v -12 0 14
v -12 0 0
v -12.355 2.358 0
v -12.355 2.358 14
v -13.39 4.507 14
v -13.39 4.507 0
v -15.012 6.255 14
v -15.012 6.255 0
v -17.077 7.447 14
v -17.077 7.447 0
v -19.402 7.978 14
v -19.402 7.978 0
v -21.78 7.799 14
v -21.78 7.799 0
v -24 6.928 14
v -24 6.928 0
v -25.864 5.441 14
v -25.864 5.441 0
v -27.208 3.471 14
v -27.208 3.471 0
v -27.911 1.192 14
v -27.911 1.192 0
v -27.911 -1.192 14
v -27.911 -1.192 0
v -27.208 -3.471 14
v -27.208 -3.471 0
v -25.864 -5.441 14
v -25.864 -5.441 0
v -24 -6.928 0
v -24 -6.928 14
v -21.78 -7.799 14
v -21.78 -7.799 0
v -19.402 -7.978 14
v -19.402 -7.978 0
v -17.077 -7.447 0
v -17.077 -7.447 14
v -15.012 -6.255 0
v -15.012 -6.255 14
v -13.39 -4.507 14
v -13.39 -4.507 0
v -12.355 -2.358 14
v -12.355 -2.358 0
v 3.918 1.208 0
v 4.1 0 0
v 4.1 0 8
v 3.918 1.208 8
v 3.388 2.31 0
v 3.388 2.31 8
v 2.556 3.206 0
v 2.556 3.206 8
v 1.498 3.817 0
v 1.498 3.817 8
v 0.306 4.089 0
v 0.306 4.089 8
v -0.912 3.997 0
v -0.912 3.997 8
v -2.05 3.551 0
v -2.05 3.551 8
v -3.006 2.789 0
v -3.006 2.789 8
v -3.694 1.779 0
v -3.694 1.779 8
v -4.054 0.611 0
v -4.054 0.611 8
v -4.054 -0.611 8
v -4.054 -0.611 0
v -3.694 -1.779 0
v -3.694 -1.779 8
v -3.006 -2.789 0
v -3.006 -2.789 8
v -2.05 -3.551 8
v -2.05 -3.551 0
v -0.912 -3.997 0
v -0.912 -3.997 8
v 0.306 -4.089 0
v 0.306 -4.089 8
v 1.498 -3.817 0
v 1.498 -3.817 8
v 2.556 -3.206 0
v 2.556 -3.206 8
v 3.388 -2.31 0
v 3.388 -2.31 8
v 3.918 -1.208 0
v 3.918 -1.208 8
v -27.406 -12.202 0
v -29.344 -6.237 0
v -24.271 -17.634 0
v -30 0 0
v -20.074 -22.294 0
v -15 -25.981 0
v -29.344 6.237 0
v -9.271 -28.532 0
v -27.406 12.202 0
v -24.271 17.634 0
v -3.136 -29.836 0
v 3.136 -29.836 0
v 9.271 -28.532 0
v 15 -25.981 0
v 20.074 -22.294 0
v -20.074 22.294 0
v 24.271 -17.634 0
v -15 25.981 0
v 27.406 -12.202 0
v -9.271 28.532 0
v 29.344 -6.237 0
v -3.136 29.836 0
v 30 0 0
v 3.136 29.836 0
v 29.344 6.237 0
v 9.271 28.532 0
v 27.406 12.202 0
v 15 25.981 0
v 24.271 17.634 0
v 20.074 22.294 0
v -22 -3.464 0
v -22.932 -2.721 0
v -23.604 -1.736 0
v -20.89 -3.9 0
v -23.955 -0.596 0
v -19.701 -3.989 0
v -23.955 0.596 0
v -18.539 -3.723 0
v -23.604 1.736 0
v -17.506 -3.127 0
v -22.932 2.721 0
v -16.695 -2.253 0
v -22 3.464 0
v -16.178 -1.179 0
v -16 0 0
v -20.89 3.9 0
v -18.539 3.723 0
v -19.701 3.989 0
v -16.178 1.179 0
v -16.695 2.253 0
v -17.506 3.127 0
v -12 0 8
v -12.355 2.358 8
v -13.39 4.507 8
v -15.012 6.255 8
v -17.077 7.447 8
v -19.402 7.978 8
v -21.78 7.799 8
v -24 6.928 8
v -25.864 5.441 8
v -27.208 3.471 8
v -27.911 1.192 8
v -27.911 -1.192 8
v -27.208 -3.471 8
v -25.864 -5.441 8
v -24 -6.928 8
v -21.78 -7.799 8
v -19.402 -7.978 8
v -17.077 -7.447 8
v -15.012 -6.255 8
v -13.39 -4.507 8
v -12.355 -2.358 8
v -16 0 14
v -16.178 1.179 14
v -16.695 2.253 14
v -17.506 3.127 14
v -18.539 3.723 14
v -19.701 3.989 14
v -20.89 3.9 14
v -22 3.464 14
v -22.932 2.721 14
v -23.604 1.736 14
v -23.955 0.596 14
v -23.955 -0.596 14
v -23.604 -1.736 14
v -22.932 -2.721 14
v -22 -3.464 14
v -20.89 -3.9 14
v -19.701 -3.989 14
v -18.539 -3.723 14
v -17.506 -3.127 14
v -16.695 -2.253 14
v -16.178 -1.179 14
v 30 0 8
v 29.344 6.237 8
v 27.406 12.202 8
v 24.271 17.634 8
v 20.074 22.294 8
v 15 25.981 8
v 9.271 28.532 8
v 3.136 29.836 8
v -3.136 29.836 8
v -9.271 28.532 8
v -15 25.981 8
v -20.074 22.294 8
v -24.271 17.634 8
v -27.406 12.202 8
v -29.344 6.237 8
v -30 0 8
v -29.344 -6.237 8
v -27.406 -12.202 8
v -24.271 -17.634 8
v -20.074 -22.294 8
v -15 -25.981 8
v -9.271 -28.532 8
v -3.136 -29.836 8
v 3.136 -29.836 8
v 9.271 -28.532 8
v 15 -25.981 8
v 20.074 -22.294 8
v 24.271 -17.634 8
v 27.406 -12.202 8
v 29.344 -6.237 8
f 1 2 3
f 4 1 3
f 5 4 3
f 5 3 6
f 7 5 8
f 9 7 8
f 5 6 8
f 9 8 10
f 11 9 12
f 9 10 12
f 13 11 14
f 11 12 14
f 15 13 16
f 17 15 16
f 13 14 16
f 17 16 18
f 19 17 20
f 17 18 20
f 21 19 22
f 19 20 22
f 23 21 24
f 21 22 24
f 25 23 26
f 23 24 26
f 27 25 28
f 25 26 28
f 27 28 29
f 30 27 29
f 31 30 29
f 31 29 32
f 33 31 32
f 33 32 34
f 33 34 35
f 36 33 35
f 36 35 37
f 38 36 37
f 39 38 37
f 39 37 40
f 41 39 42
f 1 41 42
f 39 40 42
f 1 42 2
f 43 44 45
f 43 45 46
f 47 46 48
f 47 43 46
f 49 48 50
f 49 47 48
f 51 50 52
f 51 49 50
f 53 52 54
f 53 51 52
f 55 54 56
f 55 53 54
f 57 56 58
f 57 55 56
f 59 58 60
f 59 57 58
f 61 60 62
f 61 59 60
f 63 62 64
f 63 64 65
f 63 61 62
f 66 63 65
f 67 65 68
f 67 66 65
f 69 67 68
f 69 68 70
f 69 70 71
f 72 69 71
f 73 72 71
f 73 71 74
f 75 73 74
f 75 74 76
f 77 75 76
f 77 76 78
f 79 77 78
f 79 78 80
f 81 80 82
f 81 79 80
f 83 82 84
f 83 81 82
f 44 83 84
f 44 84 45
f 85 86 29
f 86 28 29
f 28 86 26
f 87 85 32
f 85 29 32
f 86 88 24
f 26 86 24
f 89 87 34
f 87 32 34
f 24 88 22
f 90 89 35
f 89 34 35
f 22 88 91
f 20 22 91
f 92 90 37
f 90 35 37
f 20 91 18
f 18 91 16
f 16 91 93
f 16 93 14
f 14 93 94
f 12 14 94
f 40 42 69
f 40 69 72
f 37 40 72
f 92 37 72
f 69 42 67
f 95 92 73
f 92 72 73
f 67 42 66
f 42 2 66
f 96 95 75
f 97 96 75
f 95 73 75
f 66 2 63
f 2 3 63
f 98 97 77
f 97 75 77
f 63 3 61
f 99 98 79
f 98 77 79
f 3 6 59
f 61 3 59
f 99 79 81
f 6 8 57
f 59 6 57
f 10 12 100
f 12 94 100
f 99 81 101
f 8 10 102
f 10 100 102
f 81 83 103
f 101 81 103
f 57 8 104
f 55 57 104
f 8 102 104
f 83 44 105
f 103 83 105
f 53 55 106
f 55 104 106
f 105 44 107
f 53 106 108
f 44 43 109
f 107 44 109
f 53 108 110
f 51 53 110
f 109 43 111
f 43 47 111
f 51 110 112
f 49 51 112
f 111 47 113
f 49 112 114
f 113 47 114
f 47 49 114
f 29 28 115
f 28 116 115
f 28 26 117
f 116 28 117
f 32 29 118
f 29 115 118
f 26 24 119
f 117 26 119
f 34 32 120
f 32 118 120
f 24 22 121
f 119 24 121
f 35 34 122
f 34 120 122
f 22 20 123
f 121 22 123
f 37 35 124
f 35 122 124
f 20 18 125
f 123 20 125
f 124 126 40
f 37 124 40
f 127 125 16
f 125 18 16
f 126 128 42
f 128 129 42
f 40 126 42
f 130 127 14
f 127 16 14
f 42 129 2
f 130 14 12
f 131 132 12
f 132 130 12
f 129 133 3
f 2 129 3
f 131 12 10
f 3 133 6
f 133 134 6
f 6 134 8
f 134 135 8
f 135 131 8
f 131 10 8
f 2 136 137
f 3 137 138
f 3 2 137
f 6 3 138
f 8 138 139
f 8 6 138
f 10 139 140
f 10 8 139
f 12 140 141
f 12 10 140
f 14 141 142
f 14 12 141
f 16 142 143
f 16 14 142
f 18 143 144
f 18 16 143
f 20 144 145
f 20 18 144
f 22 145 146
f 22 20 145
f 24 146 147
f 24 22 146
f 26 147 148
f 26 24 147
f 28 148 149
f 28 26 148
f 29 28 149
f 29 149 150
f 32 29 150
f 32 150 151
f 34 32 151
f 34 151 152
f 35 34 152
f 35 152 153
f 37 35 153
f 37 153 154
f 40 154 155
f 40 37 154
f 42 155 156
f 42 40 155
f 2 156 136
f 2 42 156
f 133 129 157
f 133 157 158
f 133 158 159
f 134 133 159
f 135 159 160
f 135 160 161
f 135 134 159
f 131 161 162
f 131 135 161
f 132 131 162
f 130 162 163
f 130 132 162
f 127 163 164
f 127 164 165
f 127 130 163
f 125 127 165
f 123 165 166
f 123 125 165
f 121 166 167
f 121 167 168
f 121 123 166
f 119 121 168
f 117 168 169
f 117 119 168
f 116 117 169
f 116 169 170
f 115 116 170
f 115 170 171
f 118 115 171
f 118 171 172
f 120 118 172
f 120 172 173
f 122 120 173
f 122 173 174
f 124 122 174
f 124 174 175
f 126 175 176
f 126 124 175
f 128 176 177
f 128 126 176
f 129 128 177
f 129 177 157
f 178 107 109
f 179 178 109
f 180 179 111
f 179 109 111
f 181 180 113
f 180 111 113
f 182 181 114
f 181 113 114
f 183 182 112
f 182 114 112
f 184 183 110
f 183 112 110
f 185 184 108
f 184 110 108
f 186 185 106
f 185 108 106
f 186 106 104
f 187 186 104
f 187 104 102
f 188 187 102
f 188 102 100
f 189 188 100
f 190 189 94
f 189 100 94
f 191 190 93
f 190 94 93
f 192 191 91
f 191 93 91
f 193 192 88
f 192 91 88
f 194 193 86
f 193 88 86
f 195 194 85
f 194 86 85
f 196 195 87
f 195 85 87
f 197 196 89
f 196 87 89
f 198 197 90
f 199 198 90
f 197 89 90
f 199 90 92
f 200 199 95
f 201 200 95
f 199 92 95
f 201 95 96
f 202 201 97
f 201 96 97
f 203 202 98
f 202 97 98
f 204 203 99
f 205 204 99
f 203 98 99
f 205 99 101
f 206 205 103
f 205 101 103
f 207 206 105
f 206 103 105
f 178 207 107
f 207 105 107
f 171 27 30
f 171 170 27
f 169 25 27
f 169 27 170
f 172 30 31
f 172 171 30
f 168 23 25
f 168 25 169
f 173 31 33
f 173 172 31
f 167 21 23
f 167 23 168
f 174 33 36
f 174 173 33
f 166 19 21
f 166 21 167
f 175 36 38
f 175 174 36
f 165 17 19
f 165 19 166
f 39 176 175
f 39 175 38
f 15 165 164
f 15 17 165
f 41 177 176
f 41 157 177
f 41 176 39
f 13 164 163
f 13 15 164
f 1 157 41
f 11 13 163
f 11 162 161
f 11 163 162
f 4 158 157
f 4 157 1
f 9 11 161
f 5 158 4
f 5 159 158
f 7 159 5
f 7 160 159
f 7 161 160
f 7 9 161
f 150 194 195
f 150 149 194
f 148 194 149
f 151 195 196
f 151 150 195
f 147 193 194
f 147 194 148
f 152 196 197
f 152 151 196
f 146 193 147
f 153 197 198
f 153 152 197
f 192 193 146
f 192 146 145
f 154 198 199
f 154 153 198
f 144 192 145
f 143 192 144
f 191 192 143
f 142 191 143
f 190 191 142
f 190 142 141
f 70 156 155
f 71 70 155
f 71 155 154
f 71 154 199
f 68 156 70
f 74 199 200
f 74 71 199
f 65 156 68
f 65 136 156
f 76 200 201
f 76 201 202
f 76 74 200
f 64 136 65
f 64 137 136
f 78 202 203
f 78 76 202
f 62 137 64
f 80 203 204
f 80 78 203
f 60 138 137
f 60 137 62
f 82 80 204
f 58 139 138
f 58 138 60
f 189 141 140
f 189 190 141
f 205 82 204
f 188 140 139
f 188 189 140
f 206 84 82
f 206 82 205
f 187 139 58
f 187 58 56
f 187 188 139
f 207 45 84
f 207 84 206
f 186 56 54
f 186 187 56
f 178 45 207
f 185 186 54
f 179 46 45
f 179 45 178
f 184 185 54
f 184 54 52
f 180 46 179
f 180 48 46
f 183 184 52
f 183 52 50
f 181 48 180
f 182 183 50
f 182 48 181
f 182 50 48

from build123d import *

# Parameters (mm, degrees)
SKETCH_1_R      = 30
SKETCH_1_R_2    = 4.1
SKETCH_1_R_3    = 8
EXTRUDE_3_DEPTH = 8
SKETCH_1_5_R    = 8
SKETCH_1_5_R_2  = 4
EXTRUDE_4_DEPTH = 14


with BuildPart() as part:
    # 草图1 → 凸台-拉伸3 (new body)
    with BuildSketch(Plane.XY):
        Circle(SKETCH_1_R)
        Circle(SKETCH_1_R_2, mode=Mode.SUBTRACT)
        with Locations((-20, 0)):
            Circle(SKETCH_1_R_3, mode=Mode.SUBTRACT)
    extrude(amount=EXTRUDE_3_DEPTH)


with BuildPart() as body_2:
    # 草图1<5> → 凸台-拉伸4 (new body)
    with BuildSketch(Plane.XY):
        with Locations((-20, 0)):
            Circle(SKETCH_1_5_R)
        with Locations((-20, 0)):
            Circle(SKETCH_1_5_R_2, mode=Mode.SUBTRACT)
    extrude(amount=EXTRUDE_4_DEPTH)


solid = Compound([part.part, body_2.part])
